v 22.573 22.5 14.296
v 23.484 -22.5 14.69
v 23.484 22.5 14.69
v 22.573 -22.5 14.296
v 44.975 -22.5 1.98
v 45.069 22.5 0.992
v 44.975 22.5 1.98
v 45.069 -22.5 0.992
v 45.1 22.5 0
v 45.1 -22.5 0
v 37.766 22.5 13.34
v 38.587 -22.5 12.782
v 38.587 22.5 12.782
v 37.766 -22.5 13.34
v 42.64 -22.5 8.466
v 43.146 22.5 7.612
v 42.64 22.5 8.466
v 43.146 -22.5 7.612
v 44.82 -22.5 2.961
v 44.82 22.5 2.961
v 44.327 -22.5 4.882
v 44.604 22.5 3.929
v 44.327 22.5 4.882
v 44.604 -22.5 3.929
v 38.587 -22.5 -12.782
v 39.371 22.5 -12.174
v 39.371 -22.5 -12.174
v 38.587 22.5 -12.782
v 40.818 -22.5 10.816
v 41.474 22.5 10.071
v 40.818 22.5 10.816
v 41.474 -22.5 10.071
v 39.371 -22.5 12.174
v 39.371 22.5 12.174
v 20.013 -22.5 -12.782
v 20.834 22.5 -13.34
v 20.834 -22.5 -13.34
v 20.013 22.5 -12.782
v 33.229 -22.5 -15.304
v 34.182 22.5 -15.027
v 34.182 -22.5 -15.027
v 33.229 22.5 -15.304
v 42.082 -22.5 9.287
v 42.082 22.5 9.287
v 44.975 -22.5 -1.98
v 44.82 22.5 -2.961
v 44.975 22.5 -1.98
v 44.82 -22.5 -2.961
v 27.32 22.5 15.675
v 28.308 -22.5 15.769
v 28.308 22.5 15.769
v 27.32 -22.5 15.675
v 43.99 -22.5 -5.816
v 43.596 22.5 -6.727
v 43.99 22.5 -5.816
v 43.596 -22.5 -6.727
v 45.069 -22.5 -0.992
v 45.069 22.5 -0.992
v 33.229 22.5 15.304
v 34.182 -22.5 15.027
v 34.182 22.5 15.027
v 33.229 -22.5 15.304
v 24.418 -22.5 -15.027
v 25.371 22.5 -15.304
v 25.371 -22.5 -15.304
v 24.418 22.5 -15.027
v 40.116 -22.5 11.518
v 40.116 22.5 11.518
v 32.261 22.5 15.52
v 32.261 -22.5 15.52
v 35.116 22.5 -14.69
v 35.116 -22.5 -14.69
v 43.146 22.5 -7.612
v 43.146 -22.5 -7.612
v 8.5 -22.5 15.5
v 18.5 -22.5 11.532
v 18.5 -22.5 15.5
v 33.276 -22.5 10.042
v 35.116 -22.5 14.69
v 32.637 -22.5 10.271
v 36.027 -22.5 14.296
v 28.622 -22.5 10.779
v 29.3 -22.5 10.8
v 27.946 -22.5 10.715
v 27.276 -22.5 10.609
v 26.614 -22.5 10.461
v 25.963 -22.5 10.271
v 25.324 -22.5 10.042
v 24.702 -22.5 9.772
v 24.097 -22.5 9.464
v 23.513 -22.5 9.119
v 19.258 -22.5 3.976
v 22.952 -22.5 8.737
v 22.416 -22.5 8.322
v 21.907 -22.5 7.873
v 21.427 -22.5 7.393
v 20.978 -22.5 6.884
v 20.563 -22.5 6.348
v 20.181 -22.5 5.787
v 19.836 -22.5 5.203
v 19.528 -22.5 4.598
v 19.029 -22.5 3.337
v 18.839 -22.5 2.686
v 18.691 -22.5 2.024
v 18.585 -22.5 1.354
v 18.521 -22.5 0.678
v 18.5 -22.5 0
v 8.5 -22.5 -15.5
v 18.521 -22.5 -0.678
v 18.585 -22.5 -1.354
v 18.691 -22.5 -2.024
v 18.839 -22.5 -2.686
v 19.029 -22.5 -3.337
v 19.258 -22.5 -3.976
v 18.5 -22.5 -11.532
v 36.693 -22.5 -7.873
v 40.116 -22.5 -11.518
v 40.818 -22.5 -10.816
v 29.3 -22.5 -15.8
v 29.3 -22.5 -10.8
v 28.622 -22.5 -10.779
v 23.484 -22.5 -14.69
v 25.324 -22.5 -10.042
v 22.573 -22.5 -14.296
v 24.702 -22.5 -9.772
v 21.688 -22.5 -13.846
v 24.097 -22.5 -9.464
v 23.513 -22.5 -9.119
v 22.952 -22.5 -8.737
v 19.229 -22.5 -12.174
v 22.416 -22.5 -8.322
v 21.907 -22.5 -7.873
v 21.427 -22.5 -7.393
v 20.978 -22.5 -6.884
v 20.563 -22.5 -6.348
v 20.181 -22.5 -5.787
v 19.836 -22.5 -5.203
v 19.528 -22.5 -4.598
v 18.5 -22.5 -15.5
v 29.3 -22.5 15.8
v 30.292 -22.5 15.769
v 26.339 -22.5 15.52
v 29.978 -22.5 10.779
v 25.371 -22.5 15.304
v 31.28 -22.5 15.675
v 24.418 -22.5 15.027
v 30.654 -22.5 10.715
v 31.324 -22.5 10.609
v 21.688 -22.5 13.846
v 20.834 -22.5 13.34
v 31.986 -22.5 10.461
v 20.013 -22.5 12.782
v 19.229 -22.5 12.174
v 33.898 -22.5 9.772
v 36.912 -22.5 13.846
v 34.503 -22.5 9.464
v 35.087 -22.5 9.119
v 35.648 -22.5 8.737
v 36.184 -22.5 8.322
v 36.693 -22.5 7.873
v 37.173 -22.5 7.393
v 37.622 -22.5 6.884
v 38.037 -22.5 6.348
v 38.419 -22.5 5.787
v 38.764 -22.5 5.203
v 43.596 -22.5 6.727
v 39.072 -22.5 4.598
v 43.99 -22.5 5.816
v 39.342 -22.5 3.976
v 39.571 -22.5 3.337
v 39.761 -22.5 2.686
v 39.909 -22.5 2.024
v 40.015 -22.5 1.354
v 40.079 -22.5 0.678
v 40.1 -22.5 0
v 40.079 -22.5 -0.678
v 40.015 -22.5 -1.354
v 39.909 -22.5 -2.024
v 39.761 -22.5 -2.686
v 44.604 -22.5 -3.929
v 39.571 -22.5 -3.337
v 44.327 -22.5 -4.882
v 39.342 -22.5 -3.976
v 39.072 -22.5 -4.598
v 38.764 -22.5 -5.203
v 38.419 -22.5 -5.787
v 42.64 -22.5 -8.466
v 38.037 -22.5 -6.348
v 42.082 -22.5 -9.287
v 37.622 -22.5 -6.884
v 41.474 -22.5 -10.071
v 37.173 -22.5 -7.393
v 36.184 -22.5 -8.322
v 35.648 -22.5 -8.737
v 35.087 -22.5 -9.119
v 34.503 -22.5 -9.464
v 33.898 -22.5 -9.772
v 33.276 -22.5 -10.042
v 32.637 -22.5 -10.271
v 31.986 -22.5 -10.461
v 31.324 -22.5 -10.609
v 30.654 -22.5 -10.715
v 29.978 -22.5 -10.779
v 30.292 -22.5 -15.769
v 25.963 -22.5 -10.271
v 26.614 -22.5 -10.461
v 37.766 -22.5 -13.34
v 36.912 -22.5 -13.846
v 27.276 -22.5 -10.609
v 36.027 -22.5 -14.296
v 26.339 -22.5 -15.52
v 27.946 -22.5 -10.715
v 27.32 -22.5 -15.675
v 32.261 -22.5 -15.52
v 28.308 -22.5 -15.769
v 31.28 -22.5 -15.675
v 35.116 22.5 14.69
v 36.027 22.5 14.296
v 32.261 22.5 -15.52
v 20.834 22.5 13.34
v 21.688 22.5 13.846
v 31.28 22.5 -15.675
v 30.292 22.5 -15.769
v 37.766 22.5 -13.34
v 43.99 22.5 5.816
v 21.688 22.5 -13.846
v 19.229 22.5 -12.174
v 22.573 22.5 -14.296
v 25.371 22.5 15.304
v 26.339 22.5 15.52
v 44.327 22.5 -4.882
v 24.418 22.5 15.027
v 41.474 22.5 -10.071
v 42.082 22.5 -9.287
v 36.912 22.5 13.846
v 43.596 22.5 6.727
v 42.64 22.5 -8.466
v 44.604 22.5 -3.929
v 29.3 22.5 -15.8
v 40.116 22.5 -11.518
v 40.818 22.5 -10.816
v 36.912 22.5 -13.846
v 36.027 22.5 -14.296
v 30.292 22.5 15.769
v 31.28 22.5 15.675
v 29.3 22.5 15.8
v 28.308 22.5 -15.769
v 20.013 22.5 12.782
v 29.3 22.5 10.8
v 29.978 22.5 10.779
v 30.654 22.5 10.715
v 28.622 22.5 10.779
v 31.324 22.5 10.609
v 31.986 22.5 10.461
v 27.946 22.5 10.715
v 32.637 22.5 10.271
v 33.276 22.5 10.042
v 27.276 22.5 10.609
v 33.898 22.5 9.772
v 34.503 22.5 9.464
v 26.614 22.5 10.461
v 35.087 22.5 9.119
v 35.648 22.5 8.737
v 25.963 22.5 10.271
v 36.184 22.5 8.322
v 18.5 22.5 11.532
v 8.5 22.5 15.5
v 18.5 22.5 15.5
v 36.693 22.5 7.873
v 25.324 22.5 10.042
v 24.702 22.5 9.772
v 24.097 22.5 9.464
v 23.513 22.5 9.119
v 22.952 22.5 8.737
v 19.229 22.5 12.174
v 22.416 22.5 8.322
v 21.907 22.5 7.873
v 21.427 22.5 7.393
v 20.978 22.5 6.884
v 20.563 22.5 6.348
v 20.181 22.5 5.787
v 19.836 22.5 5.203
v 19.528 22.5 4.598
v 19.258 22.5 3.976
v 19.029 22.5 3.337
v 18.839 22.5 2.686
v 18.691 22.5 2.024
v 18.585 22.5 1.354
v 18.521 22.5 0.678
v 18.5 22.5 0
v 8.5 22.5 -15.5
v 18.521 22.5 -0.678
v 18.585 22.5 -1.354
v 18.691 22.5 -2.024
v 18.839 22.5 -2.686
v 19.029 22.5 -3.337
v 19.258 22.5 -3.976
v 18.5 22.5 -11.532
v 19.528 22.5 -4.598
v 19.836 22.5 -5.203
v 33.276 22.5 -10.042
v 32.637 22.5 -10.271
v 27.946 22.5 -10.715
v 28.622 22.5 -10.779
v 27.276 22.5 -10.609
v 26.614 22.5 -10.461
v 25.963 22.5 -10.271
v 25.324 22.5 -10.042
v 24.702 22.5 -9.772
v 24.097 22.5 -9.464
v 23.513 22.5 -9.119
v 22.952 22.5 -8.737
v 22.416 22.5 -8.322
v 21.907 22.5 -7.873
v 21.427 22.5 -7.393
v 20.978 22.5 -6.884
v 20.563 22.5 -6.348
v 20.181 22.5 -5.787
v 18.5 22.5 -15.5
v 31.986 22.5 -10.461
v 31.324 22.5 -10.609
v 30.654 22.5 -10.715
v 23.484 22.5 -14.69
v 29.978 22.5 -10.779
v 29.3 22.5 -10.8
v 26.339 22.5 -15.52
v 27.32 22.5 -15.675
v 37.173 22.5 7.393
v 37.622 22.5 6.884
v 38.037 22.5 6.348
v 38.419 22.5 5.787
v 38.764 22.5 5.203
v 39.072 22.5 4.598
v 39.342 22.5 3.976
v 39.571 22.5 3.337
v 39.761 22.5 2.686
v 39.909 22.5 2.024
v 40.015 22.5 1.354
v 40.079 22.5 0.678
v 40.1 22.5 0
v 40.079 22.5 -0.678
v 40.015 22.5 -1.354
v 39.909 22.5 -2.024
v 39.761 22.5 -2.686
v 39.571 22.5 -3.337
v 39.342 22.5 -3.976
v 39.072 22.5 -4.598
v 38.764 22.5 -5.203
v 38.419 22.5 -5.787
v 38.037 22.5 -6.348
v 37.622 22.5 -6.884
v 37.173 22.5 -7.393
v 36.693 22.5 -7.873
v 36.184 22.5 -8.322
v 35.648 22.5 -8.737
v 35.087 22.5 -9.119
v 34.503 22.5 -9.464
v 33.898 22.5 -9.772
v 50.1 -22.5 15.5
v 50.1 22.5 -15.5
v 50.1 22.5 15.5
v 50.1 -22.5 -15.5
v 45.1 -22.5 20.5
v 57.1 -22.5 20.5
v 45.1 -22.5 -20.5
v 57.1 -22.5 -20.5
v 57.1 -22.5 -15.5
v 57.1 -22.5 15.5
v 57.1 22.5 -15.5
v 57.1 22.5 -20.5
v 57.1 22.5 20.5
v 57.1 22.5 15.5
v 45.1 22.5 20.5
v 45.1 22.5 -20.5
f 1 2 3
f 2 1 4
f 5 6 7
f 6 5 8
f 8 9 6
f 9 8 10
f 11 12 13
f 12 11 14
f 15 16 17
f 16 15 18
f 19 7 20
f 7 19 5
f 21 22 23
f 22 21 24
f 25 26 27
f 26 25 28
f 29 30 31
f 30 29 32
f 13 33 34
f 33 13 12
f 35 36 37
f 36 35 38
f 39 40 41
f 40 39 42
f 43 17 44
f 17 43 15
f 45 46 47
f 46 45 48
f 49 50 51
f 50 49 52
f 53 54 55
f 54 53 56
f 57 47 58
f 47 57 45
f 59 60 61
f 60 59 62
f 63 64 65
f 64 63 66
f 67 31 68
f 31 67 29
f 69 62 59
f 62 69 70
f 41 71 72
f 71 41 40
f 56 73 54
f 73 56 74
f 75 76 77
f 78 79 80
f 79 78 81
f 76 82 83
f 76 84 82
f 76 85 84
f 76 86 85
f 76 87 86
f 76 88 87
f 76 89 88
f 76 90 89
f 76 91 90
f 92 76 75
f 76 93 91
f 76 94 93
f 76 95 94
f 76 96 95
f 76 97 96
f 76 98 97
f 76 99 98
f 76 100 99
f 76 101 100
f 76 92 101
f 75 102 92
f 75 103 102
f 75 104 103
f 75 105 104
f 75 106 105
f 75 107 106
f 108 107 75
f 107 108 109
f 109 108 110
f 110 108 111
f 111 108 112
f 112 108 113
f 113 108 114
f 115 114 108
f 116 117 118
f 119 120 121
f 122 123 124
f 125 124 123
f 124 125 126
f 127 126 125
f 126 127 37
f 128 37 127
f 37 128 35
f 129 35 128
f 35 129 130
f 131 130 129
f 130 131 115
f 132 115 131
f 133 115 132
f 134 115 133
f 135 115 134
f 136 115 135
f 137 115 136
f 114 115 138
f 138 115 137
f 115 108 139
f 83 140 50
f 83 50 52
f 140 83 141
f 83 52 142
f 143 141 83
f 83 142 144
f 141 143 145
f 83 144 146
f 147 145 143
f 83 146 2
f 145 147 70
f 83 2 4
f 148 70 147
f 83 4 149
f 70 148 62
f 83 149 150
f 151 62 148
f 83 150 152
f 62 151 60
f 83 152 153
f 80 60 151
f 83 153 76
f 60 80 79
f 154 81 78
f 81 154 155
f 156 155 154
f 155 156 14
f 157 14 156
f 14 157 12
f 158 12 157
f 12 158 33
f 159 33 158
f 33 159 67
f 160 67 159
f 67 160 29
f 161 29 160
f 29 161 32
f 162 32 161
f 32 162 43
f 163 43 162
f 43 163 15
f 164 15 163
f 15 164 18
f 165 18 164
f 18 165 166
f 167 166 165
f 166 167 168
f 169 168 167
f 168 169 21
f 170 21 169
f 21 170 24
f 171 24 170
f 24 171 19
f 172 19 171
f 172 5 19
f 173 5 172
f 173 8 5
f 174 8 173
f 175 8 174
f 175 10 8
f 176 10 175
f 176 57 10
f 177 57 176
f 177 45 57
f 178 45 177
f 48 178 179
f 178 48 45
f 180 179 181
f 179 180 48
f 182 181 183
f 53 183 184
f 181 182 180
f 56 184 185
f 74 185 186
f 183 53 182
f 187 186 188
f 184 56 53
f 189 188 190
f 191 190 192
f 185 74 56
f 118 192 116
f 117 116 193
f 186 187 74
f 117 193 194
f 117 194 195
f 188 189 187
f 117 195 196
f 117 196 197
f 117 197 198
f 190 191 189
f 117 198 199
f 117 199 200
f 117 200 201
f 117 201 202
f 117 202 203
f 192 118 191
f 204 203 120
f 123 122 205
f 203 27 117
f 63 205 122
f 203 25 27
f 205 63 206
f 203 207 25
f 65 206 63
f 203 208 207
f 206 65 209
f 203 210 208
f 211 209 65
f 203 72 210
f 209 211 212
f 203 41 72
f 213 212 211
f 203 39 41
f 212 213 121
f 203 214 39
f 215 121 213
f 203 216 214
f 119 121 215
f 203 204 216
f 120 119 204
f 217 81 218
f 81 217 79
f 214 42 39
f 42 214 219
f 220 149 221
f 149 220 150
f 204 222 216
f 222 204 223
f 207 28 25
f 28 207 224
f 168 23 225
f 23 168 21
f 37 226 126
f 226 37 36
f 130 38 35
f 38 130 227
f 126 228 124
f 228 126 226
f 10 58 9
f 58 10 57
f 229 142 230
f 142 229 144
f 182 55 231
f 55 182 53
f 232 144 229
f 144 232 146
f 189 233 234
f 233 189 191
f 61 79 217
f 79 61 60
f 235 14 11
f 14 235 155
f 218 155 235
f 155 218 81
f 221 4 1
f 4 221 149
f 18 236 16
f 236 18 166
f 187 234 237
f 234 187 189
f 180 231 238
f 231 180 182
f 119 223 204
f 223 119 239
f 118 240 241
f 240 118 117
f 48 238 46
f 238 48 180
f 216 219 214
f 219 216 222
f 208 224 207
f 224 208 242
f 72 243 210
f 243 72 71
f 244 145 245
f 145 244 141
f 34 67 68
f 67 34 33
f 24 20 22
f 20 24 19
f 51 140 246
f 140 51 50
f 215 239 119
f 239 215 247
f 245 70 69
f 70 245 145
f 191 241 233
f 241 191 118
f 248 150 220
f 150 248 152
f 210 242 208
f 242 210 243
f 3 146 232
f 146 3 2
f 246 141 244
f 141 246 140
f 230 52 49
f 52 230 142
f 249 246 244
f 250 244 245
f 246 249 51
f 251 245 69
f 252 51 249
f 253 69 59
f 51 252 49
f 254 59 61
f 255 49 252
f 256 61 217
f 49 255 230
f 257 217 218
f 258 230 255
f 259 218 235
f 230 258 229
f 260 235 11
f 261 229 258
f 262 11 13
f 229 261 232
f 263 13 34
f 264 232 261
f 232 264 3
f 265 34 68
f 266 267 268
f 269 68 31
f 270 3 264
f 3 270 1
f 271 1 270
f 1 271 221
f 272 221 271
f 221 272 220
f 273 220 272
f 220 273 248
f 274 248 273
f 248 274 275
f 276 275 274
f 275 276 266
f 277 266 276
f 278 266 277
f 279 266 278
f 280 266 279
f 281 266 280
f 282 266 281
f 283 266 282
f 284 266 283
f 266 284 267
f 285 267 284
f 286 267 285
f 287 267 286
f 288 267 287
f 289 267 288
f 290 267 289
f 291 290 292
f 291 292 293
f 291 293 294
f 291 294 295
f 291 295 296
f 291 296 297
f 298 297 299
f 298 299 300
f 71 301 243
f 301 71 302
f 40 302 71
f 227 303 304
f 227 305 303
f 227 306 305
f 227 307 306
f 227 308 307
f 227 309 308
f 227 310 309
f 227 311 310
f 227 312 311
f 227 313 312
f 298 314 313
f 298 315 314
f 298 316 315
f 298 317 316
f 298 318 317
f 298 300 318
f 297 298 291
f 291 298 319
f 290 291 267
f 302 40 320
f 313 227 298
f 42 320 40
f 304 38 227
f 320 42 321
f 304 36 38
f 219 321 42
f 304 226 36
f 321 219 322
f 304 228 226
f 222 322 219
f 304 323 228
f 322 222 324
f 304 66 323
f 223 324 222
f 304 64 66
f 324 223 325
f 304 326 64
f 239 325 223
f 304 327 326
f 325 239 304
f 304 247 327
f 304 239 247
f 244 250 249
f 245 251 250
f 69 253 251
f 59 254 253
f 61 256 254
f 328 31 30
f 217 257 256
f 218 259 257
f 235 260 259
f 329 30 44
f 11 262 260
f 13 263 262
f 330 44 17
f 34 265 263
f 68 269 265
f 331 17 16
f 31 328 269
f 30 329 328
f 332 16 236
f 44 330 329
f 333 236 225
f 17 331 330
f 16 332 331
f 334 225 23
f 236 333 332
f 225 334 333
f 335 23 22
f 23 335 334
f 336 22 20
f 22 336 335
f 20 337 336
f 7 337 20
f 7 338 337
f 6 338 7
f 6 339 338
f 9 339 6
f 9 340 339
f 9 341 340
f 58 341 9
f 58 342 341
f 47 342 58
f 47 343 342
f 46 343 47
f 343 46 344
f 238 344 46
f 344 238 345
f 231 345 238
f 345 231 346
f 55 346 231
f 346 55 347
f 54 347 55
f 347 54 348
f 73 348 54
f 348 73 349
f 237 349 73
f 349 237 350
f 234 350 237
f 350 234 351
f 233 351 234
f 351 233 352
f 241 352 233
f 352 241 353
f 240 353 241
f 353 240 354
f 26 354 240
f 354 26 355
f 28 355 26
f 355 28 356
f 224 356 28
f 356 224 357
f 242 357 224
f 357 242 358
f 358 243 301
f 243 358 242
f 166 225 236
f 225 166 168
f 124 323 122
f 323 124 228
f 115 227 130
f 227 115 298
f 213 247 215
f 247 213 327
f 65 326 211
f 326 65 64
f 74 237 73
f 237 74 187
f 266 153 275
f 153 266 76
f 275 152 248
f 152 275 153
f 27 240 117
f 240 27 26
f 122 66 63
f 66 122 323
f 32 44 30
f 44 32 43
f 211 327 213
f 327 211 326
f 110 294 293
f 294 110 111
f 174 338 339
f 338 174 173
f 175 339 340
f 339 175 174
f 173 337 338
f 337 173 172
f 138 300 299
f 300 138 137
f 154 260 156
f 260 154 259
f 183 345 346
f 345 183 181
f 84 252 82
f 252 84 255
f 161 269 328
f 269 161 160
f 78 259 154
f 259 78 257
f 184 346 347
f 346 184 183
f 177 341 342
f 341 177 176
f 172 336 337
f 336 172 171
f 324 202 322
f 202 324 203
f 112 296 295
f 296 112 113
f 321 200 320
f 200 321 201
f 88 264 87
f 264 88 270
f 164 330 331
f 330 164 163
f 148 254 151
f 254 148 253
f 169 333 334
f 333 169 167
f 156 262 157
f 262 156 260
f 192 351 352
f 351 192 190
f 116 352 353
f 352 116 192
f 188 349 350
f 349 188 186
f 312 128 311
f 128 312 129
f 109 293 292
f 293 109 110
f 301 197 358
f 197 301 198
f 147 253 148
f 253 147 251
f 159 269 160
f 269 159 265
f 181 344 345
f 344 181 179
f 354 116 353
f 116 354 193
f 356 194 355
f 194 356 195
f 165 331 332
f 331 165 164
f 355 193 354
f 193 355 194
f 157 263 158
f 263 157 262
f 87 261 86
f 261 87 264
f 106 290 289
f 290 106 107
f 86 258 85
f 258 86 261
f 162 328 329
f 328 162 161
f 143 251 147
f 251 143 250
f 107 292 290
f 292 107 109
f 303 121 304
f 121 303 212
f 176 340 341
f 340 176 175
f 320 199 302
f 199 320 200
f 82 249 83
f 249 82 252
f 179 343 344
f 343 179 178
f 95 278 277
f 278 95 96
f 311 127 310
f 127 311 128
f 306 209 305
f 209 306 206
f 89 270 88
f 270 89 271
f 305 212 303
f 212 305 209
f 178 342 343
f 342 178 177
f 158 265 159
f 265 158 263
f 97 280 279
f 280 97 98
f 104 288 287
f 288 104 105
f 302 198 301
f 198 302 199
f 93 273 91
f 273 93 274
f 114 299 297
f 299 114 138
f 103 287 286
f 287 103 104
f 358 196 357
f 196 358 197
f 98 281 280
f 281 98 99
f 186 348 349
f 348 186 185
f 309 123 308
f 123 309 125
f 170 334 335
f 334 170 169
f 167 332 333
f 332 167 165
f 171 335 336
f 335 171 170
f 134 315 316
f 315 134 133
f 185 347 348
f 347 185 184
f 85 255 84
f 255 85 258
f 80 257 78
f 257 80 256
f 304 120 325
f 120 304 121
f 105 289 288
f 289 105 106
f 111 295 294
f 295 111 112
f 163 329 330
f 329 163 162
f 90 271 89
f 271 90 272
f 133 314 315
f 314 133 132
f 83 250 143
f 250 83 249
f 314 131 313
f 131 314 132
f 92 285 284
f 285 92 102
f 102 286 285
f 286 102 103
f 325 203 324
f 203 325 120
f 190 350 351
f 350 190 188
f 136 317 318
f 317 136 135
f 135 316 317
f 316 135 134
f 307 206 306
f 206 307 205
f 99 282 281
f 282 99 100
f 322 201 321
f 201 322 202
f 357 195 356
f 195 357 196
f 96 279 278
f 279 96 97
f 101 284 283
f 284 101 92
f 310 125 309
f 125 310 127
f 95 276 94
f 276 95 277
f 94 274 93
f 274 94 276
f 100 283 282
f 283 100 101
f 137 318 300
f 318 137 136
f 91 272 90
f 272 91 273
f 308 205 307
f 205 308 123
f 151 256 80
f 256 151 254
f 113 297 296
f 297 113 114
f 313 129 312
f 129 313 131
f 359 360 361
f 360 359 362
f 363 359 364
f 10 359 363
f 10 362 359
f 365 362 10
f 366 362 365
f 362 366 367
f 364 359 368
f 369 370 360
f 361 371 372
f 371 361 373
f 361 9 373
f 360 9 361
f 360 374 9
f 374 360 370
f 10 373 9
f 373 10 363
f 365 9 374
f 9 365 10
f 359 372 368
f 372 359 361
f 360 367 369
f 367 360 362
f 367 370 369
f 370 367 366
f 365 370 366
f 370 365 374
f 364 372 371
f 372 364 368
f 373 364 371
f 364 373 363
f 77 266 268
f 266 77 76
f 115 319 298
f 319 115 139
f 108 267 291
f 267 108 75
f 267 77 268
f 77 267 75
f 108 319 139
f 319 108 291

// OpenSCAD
// Pipe coupler for Yagi antenna mast
// Created 31 December 2025 by Sam Gardner <sam@wx4stg.com>

// Parameters
$fn = 100;
COUPLER_LENGTH = 45;
THICK = 5;
P_OD = 27;
M_OD = 21.6;
SCREW_DIAMETER = 5;
TAPE_MEASUREW = 21;
TAPE_MEASUREH = 7;
PVC_TM_GUIDE = false;
M_TM_GUIDE = true;


// PVC pipe side
if (!M_TM_GUIDE) {
    difference() {
        cylinder(h=COUPLER_LENGTH, r=(P_OD/2)+THICK, center=true);
        union() {
            cylinder(h=COUPLER_LENGTH, r=P_OD/2, center=true);
            rotate([90, 0, 0]) cylinder(h=100, r=SCREW_DIAMETER/2, center=true);
        }
    }
    // PVC tape measure guide
    if (PVC_TM_GUIDE) {
        translate([(P_OD/2)+THICK, -(TAPE_MEASUREW/2+THICK), -COUPLER_LENGTH/2]) cube([THICK, TAPE_MEASUREW+THICK*2, COUPLER_LENGTH]);
        translate([(P_OD/2)+THICK, -(TAPE_MEASUREW/2+2*THICK), -COUPLER_LENGTH/2]) cube([TAPE_MEASUREH+THICK, THICK, COUPLER_LENGTH]);
        translate([(P_OD/2)+THICK, (TAPE_MEASUREW/2+THICK), -COUPLER_LENGTH/2]) cube([TAPE_MEASUREH+THICK, THICK, COUPLER_LENGTH]);
        translate([-((P_OD/2)+2*THICK), -(TAPE_MEASUREW/2+THICK), -COUPLER_LENGTH/2]) cube([2*THICK, TAPE_MEASUREW+THICK*2, COUPLER_LENGTH]);
    }
}

if (!PVC_TM_GUIDE) {
    // Metal pipe side
    rotate([90, 0, 0]) translate([(P_OD/2)+(M_OD/2)+THICK,0,0]) {
        difference() {
            cylinder(h=COUPLER_LENGTH, r=M_OD/2+THICK, center=true);
            cylinder(h=COUPLER_LENGTH, r=M_OD/2, center=true);
        }
        // Metal tape measure guide
        if (M_TM_GUIDE) {
            translate([(M_OD/2)+THICK, -(TAPE_MEASUREW/2+THICK), -COUPLER_LENGTH/2]) cube([THICK, TAPE_MEASUREW+THICK*2, COUPLER_LENGTH]);
            translate([(M_OD/2)+THICK, -(TAPE_MEASUREW/2+2*THICK), -COUPLER_LENGTH/2]) cube([TAPE_MEASUREH+THICK, THICK, COUPLER_LENGTH]);
            translate([(M_OD/2)+THICK, (TAPE_MEASUREW/2+THICK), -COUPLER_LENGTH/2]) cube([TAPE_MEASUREH+THICK, THICK, COUPLER_LENGTH]);
            translate([-((M_OD/2)+2*THICK), -(TAPE_MEASUREW/2+THICK), -COUPLER_LENGTH/2]) cube([2*THICK, TAPE_MEASUREW+THICK*2, COUPLER_LENGTH]);
        }
    }
}
